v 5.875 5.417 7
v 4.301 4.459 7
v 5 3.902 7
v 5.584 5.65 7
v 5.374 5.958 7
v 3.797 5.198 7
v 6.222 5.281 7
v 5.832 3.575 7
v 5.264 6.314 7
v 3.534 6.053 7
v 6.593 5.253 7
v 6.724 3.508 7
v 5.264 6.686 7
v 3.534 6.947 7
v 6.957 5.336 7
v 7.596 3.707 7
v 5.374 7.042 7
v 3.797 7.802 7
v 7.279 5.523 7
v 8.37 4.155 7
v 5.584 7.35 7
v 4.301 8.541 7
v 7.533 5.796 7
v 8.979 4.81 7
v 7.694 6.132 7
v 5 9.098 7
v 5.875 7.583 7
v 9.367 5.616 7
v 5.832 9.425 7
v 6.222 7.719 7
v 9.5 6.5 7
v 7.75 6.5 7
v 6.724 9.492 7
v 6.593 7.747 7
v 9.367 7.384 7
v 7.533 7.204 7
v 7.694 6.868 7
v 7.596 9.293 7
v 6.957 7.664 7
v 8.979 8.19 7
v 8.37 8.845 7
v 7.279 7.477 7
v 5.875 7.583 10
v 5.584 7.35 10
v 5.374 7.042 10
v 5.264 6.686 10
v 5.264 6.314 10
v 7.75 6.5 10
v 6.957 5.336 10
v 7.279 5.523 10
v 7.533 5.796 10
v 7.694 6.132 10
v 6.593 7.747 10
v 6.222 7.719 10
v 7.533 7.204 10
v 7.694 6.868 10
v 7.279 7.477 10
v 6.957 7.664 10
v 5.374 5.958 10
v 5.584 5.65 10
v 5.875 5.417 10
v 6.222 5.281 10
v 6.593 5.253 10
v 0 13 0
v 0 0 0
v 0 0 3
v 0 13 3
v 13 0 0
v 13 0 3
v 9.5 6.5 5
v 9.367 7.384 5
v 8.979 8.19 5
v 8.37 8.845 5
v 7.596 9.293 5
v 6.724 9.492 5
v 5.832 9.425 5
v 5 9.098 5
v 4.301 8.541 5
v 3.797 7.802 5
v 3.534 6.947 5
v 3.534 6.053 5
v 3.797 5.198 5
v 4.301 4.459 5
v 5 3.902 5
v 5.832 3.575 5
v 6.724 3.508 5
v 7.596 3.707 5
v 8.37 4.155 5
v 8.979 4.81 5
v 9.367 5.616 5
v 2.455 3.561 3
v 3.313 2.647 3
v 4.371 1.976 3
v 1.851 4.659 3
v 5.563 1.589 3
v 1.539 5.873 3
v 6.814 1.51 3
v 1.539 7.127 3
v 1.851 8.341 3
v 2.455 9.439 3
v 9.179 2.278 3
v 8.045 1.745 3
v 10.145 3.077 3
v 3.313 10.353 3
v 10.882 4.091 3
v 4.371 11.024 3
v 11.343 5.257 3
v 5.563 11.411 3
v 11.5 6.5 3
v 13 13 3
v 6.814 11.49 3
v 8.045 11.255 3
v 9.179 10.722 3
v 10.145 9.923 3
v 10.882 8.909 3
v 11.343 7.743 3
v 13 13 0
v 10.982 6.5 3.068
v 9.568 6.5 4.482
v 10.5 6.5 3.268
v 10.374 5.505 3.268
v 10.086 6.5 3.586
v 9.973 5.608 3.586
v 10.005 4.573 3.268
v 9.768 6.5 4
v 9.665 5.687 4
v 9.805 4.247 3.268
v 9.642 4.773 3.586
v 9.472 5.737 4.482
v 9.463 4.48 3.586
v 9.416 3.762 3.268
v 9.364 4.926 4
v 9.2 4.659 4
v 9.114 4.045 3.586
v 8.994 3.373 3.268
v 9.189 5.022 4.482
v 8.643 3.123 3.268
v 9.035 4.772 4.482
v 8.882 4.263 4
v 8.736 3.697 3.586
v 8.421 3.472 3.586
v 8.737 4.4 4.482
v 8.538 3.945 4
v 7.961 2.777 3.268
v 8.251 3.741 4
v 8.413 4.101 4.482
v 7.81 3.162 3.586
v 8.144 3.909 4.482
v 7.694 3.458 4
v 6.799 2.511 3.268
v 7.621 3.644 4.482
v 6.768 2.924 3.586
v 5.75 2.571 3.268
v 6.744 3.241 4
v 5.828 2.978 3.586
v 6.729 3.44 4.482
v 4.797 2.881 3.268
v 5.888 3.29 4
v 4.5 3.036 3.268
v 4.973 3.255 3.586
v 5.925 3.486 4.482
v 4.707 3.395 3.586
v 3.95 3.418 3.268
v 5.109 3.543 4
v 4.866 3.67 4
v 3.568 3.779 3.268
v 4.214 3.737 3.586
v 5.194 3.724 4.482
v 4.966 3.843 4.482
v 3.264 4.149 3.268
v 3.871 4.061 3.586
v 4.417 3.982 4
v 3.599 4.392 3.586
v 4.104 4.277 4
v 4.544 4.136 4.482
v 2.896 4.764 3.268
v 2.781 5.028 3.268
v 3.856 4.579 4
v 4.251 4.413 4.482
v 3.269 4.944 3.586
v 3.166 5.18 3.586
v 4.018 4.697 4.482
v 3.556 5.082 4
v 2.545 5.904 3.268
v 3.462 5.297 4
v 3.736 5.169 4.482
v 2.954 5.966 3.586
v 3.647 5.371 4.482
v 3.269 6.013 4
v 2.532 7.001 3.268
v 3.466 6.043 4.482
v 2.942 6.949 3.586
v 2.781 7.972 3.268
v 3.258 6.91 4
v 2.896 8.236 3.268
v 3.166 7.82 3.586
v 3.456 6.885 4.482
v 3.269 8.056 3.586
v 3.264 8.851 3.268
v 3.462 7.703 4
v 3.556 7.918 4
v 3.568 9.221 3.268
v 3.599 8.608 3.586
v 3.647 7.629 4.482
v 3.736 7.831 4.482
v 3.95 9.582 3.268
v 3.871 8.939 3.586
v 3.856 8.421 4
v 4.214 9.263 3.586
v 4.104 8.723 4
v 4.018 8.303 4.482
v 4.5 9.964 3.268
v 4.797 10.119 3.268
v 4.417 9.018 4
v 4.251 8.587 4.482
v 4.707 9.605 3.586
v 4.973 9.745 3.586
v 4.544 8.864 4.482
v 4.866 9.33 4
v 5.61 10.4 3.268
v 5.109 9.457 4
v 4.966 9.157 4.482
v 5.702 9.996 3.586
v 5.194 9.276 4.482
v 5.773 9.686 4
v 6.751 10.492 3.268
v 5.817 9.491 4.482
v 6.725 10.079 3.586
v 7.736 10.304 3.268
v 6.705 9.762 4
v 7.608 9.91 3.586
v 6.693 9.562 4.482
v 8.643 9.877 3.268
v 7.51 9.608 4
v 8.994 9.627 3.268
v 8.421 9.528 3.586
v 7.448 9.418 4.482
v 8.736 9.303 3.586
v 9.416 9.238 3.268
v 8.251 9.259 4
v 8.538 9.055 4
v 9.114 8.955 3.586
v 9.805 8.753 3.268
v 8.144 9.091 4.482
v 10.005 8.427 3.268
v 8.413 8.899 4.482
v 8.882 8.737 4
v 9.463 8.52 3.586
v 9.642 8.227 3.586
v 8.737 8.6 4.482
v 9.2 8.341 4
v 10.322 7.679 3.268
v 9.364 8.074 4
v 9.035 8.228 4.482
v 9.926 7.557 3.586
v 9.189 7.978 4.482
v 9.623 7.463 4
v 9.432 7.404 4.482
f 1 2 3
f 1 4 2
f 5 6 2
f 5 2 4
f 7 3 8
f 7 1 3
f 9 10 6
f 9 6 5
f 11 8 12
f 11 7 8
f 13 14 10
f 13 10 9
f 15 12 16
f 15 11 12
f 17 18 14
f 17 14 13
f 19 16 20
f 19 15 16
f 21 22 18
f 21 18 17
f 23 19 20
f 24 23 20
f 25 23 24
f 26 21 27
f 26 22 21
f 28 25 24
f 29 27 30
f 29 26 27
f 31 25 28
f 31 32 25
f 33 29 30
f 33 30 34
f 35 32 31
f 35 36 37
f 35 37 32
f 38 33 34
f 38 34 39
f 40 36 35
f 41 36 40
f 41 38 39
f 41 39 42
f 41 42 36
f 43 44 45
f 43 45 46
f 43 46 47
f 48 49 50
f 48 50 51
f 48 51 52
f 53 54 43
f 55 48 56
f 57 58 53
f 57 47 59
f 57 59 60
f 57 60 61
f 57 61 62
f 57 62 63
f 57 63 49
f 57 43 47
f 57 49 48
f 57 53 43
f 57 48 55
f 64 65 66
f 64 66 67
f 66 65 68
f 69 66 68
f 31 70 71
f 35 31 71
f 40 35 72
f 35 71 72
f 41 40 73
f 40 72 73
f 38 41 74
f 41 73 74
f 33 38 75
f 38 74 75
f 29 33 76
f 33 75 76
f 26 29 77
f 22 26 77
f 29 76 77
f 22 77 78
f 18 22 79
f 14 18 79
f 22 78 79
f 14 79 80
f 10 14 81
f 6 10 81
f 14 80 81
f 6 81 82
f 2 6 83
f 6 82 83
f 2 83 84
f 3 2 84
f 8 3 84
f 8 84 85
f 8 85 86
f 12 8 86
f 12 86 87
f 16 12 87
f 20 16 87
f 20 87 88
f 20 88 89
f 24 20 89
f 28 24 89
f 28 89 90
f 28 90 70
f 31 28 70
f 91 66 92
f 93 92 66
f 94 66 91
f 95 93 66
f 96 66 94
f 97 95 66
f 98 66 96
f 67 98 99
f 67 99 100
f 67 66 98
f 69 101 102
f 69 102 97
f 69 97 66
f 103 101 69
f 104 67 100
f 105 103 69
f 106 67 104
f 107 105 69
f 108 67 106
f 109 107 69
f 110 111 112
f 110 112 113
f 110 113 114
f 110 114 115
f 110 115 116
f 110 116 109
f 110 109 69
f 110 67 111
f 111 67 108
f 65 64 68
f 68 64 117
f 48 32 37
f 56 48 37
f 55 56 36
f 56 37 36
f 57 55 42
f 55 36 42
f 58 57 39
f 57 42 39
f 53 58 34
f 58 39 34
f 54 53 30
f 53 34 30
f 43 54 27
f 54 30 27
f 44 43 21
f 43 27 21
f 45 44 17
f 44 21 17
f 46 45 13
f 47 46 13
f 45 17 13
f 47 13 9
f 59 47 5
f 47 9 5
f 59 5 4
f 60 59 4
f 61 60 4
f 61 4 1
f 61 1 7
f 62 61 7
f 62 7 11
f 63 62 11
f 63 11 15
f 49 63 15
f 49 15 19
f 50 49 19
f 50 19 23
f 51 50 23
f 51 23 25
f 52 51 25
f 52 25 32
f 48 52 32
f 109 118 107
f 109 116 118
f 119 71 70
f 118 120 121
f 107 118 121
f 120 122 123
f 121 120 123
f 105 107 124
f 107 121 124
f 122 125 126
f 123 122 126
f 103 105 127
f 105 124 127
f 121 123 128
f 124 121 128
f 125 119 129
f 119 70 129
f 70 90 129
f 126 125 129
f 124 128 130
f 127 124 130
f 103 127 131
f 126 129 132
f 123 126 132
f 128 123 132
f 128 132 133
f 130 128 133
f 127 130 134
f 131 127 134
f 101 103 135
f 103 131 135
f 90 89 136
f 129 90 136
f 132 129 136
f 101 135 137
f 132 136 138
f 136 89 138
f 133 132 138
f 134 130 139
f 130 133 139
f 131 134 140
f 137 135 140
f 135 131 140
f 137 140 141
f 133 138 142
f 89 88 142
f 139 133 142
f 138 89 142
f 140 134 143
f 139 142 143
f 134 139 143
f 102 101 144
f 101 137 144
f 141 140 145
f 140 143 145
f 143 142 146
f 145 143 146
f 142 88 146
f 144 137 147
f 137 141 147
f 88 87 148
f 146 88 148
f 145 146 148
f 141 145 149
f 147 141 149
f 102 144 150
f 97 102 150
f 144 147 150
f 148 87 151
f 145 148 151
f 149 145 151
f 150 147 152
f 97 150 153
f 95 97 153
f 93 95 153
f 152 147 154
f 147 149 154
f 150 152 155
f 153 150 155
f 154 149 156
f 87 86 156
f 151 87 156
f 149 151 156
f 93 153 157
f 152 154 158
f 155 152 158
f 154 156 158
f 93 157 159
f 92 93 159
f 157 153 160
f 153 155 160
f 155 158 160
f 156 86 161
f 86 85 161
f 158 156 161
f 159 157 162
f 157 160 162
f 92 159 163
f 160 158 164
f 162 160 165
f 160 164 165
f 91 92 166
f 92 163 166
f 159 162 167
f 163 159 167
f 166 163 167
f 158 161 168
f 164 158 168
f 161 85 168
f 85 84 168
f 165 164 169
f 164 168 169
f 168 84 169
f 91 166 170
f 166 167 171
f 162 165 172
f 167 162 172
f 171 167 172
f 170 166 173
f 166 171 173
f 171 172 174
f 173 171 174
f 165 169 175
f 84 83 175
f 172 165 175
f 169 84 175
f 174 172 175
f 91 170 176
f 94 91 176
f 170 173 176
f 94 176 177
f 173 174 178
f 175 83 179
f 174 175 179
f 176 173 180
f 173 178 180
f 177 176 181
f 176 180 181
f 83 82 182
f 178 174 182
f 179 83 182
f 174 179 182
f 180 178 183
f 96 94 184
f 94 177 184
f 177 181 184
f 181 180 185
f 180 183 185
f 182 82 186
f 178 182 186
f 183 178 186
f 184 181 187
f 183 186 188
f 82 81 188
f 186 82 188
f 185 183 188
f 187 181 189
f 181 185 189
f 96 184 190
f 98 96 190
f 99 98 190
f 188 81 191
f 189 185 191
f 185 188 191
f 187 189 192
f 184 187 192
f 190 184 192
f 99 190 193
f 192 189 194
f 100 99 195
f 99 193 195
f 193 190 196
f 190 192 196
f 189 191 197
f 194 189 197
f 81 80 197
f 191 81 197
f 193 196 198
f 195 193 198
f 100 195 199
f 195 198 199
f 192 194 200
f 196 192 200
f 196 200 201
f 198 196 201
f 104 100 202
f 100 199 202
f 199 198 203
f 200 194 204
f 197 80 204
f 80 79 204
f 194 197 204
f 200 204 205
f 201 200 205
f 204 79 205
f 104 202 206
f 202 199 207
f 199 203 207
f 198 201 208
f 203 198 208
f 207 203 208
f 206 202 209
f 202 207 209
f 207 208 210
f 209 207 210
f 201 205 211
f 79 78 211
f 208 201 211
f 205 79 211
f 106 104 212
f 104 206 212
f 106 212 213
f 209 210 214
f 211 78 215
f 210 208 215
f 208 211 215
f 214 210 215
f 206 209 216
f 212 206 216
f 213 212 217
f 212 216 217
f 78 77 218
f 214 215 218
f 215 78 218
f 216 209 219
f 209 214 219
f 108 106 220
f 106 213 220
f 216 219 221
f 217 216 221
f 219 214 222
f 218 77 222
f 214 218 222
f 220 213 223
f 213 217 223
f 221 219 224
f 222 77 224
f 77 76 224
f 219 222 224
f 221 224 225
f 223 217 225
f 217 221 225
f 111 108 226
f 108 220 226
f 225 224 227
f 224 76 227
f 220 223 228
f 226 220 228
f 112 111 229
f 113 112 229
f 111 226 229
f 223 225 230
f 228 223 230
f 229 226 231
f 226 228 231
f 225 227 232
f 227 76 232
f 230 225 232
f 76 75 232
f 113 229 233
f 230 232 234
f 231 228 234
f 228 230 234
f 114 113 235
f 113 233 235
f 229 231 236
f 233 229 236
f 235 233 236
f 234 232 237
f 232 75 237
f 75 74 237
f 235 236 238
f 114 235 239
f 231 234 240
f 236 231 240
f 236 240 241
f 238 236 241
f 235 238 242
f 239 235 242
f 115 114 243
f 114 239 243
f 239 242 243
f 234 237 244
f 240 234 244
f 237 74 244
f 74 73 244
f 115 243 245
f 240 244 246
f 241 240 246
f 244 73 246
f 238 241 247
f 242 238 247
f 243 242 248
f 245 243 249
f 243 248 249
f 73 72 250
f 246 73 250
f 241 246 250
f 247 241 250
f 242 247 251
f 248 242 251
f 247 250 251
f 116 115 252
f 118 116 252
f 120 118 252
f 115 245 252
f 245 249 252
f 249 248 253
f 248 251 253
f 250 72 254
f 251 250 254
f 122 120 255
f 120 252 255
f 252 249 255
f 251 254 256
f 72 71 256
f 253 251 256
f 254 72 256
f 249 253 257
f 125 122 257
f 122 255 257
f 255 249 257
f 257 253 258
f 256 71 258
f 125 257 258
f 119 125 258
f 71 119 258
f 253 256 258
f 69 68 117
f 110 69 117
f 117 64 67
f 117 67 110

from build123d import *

# Parameters (mm, degrees)
F0_W     = 13
F0_H     = 13
F0_R     = 3
F0_R_2   = 1.25
F1_DEPTH = 3
F2_DEPTH = 7
F3_DEPTH = 10
F4_R     = 2


with BuildPart() as f1:
    # F0 (on Top) → F1 (new body)
    with BuildSketch(Plane.XY):
        with Locations((6.5, 6.5)):
            Rectangle(F0_W, F0_H)
        with Locations((6.5, 6.5)):
            Circle(F0_R, mode=Mode.SUBTRACT)
        with Locations((6.5, 6.5)):
            Circle(F0_R)
        with Locations((6.5, 6.5)):
            Circle(F0_R_2, mode=Mode.SUBTRACT)
        with Locations((6.5, 6.5)):
            Circle(F0_R_2)
    extrude(amount=F1_DEPTH)

    # F0 (on Top) → F2 (join)
    with BuildSketch(Plane.XY):
        with Locations((6.5, 6.5)):
            Circle(F0_R)
        with Locations((6.5, 6.5)):
            Circle(F0_R_2, mode=Mode.SUBTRACT)
        with Locations((6.5, 6.5)):
            Circle(F0_R_2)
    extrude(amount=F2_DEPTH)

    # F0 (on Top) → F3 (join)
    with BuildSketch(Plane.XY):
        with Locations((6.5, 6.5)):
            Circle(F0_R_2)
    extrude(amount=F3_DEPTH)

    # F4
    f4_edges = [f1.edges().sort_by_distance(p)[0] for p in [
        (3.5, 6.5, 3),
    ]]
    fillet(f4_edges, radius=F4_R)


solid = f1.part
